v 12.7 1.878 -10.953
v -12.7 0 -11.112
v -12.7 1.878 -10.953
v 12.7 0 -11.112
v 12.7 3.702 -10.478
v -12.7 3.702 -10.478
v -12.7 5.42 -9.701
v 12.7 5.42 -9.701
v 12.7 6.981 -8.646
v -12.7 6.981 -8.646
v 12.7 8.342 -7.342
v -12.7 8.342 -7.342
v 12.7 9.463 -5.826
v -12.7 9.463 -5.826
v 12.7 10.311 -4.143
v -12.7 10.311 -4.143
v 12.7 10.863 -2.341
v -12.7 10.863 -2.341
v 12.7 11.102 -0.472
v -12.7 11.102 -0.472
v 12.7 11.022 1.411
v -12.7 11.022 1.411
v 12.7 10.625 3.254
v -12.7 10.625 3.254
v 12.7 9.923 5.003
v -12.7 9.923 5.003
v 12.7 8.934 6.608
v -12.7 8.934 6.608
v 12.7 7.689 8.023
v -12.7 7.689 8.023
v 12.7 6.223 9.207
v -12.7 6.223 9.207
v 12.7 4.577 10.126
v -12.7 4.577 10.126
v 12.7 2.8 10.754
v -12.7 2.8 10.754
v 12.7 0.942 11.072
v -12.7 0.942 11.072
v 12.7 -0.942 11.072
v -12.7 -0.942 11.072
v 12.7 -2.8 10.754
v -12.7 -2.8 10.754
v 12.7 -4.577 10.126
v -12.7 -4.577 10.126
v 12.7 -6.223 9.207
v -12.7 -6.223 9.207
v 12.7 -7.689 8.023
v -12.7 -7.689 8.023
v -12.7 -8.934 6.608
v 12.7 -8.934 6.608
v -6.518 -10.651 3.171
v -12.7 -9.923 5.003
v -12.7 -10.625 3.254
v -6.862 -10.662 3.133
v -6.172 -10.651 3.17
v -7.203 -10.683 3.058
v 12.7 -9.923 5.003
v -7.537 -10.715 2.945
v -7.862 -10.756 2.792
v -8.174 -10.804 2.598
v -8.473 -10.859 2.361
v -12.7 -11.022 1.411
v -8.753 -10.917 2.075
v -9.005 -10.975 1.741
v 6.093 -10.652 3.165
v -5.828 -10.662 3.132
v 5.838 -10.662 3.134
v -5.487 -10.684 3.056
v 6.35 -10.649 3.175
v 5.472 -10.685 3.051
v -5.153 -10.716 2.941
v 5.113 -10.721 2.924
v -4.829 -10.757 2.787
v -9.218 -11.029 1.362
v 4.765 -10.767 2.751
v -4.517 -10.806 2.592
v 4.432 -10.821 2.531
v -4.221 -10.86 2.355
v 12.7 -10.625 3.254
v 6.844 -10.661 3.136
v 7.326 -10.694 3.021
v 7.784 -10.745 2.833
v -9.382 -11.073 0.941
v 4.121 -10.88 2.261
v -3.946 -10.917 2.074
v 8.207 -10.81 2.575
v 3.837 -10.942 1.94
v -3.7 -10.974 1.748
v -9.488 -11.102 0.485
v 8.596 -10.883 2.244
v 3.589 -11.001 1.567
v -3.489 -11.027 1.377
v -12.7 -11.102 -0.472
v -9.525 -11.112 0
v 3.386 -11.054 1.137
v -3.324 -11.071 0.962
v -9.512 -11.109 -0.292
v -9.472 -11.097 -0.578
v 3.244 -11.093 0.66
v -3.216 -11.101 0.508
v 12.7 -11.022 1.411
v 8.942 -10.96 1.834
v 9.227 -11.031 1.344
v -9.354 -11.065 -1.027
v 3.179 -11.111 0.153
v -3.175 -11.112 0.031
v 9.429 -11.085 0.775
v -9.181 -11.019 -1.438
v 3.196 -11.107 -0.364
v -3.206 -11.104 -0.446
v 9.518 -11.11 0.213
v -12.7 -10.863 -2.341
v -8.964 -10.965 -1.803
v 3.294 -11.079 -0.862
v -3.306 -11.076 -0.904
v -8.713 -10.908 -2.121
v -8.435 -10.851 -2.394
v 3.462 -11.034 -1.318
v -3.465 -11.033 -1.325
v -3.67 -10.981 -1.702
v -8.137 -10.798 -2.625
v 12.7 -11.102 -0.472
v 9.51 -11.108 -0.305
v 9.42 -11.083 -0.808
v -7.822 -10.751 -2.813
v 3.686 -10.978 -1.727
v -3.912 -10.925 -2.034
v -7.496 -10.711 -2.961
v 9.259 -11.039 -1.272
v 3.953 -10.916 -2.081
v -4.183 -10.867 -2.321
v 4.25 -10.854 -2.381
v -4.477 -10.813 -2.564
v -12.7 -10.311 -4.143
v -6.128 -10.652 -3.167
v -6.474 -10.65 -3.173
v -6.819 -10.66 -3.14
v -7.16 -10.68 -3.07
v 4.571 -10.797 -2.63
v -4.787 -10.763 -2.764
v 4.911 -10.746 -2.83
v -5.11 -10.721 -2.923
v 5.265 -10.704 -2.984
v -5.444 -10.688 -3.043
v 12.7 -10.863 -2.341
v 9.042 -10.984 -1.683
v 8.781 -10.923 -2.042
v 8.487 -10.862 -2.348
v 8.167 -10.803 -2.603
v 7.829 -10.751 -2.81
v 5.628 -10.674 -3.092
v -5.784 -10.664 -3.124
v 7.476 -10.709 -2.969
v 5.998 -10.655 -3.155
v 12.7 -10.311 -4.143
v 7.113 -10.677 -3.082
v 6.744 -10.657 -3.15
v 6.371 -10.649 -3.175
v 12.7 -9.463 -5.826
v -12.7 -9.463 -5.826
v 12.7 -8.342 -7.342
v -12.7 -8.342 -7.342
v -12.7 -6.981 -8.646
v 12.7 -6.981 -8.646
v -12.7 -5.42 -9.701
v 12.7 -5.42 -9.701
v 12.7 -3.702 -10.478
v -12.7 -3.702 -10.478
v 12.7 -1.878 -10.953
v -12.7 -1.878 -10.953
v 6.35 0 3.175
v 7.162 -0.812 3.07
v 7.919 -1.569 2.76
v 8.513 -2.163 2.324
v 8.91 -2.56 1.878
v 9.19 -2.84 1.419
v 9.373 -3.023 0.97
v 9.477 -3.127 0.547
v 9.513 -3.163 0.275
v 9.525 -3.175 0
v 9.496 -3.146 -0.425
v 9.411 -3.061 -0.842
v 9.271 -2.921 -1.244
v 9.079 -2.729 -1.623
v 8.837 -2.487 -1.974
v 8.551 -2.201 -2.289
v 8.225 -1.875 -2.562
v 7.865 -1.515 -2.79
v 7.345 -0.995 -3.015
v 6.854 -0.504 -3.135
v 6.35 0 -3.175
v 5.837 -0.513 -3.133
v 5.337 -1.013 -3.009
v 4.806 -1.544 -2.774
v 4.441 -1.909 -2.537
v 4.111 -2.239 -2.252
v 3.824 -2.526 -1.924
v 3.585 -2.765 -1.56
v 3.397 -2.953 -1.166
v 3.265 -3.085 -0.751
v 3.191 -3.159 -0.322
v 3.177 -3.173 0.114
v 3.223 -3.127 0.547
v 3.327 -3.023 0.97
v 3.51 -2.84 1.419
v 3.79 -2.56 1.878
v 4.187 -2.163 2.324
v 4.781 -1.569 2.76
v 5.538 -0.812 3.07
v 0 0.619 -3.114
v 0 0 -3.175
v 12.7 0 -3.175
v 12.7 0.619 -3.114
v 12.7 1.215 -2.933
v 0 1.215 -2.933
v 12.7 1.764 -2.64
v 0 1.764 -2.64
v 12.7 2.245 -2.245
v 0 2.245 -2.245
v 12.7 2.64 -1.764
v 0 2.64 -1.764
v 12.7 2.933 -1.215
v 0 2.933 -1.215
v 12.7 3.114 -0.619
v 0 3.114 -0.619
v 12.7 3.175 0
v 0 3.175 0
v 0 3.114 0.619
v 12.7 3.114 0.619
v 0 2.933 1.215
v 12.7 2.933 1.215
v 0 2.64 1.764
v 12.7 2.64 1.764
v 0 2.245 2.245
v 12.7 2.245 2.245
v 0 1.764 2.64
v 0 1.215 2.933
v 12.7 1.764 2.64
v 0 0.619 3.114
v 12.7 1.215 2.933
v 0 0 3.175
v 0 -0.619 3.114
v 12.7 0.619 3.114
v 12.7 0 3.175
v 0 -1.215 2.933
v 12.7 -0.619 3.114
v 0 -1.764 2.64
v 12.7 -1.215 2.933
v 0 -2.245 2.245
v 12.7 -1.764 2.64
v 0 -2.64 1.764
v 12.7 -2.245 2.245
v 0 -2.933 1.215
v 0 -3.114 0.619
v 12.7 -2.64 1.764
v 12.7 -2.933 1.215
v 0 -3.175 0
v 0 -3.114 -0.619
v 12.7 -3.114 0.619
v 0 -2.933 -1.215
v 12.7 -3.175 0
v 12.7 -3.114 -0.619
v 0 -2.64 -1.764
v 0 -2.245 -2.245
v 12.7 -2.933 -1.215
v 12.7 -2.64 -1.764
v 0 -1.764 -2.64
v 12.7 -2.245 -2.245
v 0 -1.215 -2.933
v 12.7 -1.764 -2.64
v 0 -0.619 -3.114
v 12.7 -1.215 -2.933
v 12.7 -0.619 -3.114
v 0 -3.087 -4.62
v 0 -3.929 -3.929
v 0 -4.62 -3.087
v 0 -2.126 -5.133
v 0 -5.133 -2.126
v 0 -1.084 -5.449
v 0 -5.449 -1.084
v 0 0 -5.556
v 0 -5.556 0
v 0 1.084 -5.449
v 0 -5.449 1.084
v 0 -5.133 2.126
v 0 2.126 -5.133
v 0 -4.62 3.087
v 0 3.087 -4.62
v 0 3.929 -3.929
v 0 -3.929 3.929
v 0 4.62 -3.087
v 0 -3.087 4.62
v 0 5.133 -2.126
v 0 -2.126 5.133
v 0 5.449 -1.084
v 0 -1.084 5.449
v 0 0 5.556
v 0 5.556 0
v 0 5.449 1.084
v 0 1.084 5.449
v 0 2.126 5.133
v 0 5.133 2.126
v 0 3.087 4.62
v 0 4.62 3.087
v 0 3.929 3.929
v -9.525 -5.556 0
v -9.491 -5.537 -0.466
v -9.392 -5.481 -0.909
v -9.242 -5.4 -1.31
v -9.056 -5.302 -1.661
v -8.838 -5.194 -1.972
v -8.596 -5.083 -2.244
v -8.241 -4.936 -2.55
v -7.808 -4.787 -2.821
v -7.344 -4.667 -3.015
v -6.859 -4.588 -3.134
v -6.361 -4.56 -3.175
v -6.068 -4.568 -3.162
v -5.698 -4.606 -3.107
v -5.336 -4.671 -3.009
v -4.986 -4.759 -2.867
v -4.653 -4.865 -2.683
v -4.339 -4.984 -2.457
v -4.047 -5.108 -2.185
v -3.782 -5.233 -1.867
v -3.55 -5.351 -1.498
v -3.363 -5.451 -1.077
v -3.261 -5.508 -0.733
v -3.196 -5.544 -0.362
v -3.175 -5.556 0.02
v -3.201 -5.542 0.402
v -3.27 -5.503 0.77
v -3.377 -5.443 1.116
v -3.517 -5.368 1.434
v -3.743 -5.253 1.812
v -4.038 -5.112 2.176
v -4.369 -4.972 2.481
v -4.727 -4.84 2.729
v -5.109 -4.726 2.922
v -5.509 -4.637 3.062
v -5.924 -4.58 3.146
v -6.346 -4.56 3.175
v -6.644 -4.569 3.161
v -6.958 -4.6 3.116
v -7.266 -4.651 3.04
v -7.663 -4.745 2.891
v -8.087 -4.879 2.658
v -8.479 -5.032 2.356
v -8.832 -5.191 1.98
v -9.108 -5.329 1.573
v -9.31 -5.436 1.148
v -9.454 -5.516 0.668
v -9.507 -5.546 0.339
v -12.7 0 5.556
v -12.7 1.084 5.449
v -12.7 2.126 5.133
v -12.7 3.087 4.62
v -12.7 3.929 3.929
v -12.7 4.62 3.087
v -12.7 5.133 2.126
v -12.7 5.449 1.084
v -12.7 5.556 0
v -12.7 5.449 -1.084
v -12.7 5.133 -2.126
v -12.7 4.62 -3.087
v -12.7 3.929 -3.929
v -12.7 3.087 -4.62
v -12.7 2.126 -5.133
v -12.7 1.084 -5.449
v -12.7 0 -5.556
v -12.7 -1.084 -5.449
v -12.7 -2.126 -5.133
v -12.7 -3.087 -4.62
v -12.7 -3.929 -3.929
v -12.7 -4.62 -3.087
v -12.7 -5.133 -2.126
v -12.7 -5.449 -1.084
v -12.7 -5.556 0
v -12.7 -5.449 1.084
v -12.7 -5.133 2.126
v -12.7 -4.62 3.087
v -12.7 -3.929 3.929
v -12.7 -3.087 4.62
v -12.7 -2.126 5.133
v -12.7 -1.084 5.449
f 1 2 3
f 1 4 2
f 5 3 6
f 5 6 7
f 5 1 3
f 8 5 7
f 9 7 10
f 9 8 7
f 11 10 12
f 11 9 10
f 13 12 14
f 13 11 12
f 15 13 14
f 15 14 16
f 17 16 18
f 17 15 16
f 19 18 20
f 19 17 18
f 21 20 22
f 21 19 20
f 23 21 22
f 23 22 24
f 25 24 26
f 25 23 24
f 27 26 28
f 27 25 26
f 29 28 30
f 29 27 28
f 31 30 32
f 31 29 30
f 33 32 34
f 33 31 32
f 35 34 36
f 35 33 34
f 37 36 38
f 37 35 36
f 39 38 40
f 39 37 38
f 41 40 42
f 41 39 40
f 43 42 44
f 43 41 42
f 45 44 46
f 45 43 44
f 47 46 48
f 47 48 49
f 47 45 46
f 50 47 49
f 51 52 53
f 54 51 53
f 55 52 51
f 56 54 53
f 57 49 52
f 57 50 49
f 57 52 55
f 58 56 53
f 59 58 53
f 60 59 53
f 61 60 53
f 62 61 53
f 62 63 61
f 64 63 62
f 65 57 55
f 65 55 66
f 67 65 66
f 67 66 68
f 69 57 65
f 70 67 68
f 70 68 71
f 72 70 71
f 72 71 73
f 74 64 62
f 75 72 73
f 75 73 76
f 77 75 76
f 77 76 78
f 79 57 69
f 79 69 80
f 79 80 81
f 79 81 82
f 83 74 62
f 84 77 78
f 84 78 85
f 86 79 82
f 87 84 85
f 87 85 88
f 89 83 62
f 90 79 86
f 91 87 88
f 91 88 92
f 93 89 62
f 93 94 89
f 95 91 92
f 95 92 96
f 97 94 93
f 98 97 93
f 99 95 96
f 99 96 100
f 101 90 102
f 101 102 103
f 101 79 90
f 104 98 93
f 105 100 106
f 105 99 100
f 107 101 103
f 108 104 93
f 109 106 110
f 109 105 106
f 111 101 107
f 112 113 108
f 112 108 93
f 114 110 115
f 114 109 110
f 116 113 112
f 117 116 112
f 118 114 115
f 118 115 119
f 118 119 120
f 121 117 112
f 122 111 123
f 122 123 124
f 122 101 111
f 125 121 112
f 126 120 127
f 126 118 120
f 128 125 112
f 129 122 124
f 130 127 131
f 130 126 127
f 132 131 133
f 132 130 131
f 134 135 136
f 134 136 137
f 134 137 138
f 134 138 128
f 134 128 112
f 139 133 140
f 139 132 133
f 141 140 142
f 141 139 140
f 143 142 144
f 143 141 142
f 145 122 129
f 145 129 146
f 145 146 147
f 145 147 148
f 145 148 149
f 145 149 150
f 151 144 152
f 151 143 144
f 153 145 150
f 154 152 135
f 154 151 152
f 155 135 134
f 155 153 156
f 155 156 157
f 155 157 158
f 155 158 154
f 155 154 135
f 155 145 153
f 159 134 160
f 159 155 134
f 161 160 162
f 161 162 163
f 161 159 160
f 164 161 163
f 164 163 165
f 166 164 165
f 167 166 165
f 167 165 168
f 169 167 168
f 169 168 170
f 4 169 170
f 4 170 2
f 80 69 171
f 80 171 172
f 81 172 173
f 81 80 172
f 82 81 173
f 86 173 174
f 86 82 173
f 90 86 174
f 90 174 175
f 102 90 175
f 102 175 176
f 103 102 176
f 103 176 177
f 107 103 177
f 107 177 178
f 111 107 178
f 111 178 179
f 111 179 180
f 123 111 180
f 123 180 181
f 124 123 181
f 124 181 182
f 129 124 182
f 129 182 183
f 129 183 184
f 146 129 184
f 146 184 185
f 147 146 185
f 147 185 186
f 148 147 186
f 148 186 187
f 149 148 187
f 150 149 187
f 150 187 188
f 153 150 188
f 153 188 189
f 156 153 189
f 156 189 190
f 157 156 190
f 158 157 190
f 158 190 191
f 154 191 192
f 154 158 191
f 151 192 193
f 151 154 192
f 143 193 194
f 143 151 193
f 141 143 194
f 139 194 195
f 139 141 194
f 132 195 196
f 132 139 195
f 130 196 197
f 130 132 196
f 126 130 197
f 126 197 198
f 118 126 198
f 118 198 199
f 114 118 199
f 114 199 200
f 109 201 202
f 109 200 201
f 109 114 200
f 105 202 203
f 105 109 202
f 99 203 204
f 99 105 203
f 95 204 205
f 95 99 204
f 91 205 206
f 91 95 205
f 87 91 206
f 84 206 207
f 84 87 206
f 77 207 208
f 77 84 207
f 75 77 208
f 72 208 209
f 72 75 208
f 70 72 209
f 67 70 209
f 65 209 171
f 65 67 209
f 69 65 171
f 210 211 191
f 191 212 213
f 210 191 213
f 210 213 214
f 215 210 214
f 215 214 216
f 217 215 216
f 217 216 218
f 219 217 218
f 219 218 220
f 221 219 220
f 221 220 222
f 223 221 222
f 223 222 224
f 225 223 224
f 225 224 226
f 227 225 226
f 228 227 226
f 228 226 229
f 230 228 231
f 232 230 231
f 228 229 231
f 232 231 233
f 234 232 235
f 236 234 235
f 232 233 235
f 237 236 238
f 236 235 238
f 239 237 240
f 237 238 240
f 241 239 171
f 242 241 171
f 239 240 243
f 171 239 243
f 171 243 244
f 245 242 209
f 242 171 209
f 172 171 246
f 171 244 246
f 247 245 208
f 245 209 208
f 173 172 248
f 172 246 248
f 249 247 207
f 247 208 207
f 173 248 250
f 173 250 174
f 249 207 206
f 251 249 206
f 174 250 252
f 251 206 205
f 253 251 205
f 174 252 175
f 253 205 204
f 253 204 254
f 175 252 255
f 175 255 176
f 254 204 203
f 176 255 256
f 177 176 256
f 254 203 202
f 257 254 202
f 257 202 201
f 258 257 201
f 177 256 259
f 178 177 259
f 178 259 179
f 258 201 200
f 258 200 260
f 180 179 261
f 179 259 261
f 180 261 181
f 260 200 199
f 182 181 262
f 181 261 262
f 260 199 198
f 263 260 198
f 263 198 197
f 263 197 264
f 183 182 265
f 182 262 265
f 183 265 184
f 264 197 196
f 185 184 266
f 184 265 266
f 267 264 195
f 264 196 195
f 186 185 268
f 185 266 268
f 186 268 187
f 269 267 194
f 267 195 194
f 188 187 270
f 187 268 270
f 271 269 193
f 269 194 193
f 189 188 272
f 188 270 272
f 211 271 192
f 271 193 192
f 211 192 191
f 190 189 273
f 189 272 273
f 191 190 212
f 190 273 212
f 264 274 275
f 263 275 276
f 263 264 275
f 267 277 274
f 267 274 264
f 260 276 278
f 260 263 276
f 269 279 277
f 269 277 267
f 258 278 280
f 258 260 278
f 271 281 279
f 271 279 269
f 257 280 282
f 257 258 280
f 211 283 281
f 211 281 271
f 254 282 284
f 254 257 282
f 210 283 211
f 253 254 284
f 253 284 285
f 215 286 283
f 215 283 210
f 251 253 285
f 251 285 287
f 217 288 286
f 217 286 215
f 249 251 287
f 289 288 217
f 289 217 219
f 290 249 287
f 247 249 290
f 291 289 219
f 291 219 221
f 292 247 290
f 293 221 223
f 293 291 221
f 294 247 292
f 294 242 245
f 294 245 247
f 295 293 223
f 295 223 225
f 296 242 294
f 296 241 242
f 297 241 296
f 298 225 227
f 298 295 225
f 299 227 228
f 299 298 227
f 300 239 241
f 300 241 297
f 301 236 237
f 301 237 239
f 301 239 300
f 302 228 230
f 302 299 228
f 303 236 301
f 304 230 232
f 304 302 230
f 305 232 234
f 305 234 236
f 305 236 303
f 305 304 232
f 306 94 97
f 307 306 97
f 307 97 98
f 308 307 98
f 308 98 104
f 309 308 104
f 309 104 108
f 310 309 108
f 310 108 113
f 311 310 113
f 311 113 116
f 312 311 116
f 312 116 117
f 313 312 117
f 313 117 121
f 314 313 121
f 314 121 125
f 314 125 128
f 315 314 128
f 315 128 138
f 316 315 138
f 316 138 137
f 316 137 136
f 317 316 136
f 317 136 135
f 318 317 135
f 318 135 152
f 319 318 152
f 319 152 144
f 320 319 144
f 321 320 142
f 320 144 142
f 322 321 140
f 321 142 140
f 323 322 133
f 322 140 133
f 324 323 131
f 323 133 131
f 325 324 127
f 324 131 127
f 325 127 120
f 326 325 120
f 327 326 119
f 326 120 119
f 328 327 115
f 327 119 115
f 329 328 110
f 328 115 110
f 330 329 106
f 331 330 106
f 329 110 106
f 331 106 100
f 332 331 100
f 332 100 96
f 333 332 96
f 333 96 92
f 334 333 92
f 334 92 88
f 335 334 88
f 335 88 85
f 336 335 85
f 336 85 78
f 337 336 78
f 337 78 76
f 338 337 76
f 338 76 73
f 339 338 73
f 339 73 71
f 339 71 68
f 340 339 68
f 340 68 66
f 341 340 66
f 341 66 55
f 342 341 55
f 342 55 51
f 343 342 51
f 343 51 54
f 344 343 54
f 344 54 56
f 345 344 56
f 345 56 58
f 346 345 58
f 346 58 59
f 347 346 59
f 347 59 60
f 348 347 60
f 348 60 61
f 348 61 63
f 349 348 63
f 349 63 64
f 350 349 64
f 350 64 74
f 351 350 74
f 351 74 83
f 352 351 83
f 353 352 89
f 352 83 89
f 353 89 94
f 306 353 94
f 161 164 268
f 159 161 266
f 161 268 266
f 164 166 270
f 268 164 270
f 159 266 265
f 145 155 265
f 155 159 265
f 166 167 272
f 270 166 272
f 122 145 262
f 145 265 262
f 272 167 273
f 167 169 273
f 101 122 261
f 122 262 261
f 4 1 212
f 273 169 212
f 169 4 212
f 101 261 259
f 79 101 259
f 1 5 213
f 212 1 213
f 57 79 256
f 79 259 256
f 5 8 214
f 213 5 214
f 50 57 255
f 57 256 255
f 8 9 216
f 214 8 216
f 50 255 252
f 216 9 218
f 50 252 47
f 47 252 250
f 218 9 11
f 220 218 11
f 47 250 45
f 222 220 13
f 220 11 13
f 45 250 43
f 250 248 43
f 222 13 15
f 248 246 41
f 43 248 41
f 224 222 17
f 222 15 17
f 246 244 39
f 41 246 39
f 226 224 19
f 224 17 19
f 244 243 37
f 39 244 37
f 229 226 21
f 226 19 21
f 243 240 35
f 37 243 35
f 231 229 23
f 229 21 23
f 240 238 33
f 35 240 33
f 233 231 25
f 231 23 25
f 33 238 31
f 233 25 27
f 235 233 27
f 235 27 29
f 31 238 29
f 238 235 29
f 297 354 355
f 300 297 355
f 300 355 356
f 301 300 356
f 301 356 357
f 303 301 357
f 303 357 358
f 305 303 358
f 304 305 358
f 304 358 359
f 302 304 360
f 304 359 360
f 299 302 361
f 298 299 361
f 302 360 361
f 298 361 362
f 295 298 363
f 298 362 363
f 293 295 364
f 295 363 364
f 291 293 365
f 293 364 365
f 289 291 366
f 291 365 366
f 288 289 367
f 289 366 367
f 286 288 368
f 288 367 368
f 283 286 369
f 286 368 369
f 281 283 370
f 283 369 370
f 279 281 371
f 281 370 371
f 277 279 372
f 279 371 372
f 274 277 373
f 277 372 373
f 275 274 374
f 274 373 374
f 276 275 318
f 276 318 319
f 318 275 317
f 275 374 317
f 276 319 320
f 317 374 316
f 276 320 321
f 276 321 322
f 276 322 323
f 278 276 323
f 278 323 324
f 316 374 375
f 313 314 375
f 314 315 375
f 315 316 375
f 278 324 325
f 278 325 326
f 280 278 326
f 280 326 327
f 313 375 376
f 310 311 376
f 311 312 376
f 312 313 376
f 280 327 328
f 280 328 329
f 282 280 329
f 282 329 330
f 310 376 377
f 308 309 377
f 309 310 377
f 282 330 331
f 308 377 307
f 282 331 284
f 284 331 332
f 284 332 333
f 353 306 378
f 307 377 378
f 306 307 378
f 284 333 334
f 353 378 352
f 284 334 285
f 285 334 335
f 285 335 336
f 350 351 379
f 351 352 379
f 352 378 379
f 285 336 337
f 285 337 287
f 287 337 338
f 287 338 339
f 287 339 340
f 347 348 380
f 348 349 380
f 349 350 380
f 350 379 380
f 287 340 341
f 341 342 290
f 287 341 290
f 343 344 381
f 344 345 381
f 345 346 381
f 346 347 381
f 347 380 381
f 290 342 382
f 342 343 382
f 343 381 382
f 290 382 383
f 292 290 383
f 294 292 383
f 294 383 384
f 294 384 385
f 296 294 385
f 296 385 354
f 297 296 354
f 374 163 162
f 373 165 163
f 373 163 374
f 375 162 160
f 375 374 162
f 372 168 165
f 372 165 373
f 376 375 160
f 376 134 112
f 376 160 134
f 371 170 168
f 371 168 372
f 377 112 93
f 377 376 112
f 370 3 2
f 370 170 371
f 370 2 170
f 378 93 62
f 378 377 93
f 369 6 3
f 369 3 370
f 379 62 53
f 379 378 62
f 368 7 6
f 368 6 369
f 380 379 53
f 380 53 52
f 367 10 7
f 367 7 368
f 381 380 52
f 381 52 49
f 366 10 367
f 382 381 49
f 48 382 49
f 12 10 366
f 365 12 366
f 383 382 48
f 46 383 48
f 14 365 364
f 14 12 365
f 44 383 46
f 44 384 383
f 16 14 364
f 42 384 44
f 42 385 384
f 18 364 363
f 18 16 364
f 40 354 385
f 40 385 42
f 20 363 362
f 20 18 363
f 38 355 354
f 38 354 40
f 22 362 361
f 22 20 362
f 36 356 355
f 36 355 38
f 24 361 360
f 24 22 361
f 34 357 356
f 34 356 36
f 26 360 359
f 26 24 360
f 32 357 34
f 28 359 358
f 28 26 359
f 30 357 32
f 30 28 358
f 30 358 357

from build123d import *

# Parameters (mm, degrees)
SKETCH1_W         = 25.4
SKETCH1_H         = 11.1125
HOLE1_D           = 6.35
HOLE1_CBORE_D     = 11.1125
HOLE1_CBORE_DEPTH = 12.7
SKETCH4_W         = 3.175
SKETCH4_H         = 11.1125
HOLE3_D           = 6.35
HOLE3_DEPTH       = 6.552753399


with BuildPart() as part:
    # Sketch1 → Revolve1 (revolve)
    with BuildSketch(Plane.XY):
        with Locations((0, 5.55625)):
            Rectangle(SKETCH1_W, SKETCH1_H)
    revolve(axis=Axis((-12.7, 0, 0), (1, 0, 0)))

    # Hole1 (through all)
    with Locations(Plane.ZY.offset(12.7)):
        with Locations((0, 0)):
            CounterBoreHole(HOLE1_D / 2, HOLE1_CBORE_D / 2, HOLE1_CBORE_DEPTH)

    # Sketch4 → Hole2 (revolve, cut)
    with BuildSketch(Plane(origin=(6.35, 0, 0), x_dir=(0, 0, 1), z_dir=(1, 0, 0))):
        with Locations((1.5875, 5.55625)):
            Rectangle(SKETCH4_W, SKETCH4_H)
    revolve(axis=Axis((6.35, -110, 0), (0, 1, 0)), mode=Mode.SUBTRACT)

    # Hole3
    with Locations(Plane(origin=(0, -4.559746601, 0), x_dir=(1, 0, 0), z_dir=(0, 1, 0))):
        with Locations((-6.35, 0)):
            Hole(HOLE3_D / 2, depth=HOLE3_DEPTH)


solid = part.part
